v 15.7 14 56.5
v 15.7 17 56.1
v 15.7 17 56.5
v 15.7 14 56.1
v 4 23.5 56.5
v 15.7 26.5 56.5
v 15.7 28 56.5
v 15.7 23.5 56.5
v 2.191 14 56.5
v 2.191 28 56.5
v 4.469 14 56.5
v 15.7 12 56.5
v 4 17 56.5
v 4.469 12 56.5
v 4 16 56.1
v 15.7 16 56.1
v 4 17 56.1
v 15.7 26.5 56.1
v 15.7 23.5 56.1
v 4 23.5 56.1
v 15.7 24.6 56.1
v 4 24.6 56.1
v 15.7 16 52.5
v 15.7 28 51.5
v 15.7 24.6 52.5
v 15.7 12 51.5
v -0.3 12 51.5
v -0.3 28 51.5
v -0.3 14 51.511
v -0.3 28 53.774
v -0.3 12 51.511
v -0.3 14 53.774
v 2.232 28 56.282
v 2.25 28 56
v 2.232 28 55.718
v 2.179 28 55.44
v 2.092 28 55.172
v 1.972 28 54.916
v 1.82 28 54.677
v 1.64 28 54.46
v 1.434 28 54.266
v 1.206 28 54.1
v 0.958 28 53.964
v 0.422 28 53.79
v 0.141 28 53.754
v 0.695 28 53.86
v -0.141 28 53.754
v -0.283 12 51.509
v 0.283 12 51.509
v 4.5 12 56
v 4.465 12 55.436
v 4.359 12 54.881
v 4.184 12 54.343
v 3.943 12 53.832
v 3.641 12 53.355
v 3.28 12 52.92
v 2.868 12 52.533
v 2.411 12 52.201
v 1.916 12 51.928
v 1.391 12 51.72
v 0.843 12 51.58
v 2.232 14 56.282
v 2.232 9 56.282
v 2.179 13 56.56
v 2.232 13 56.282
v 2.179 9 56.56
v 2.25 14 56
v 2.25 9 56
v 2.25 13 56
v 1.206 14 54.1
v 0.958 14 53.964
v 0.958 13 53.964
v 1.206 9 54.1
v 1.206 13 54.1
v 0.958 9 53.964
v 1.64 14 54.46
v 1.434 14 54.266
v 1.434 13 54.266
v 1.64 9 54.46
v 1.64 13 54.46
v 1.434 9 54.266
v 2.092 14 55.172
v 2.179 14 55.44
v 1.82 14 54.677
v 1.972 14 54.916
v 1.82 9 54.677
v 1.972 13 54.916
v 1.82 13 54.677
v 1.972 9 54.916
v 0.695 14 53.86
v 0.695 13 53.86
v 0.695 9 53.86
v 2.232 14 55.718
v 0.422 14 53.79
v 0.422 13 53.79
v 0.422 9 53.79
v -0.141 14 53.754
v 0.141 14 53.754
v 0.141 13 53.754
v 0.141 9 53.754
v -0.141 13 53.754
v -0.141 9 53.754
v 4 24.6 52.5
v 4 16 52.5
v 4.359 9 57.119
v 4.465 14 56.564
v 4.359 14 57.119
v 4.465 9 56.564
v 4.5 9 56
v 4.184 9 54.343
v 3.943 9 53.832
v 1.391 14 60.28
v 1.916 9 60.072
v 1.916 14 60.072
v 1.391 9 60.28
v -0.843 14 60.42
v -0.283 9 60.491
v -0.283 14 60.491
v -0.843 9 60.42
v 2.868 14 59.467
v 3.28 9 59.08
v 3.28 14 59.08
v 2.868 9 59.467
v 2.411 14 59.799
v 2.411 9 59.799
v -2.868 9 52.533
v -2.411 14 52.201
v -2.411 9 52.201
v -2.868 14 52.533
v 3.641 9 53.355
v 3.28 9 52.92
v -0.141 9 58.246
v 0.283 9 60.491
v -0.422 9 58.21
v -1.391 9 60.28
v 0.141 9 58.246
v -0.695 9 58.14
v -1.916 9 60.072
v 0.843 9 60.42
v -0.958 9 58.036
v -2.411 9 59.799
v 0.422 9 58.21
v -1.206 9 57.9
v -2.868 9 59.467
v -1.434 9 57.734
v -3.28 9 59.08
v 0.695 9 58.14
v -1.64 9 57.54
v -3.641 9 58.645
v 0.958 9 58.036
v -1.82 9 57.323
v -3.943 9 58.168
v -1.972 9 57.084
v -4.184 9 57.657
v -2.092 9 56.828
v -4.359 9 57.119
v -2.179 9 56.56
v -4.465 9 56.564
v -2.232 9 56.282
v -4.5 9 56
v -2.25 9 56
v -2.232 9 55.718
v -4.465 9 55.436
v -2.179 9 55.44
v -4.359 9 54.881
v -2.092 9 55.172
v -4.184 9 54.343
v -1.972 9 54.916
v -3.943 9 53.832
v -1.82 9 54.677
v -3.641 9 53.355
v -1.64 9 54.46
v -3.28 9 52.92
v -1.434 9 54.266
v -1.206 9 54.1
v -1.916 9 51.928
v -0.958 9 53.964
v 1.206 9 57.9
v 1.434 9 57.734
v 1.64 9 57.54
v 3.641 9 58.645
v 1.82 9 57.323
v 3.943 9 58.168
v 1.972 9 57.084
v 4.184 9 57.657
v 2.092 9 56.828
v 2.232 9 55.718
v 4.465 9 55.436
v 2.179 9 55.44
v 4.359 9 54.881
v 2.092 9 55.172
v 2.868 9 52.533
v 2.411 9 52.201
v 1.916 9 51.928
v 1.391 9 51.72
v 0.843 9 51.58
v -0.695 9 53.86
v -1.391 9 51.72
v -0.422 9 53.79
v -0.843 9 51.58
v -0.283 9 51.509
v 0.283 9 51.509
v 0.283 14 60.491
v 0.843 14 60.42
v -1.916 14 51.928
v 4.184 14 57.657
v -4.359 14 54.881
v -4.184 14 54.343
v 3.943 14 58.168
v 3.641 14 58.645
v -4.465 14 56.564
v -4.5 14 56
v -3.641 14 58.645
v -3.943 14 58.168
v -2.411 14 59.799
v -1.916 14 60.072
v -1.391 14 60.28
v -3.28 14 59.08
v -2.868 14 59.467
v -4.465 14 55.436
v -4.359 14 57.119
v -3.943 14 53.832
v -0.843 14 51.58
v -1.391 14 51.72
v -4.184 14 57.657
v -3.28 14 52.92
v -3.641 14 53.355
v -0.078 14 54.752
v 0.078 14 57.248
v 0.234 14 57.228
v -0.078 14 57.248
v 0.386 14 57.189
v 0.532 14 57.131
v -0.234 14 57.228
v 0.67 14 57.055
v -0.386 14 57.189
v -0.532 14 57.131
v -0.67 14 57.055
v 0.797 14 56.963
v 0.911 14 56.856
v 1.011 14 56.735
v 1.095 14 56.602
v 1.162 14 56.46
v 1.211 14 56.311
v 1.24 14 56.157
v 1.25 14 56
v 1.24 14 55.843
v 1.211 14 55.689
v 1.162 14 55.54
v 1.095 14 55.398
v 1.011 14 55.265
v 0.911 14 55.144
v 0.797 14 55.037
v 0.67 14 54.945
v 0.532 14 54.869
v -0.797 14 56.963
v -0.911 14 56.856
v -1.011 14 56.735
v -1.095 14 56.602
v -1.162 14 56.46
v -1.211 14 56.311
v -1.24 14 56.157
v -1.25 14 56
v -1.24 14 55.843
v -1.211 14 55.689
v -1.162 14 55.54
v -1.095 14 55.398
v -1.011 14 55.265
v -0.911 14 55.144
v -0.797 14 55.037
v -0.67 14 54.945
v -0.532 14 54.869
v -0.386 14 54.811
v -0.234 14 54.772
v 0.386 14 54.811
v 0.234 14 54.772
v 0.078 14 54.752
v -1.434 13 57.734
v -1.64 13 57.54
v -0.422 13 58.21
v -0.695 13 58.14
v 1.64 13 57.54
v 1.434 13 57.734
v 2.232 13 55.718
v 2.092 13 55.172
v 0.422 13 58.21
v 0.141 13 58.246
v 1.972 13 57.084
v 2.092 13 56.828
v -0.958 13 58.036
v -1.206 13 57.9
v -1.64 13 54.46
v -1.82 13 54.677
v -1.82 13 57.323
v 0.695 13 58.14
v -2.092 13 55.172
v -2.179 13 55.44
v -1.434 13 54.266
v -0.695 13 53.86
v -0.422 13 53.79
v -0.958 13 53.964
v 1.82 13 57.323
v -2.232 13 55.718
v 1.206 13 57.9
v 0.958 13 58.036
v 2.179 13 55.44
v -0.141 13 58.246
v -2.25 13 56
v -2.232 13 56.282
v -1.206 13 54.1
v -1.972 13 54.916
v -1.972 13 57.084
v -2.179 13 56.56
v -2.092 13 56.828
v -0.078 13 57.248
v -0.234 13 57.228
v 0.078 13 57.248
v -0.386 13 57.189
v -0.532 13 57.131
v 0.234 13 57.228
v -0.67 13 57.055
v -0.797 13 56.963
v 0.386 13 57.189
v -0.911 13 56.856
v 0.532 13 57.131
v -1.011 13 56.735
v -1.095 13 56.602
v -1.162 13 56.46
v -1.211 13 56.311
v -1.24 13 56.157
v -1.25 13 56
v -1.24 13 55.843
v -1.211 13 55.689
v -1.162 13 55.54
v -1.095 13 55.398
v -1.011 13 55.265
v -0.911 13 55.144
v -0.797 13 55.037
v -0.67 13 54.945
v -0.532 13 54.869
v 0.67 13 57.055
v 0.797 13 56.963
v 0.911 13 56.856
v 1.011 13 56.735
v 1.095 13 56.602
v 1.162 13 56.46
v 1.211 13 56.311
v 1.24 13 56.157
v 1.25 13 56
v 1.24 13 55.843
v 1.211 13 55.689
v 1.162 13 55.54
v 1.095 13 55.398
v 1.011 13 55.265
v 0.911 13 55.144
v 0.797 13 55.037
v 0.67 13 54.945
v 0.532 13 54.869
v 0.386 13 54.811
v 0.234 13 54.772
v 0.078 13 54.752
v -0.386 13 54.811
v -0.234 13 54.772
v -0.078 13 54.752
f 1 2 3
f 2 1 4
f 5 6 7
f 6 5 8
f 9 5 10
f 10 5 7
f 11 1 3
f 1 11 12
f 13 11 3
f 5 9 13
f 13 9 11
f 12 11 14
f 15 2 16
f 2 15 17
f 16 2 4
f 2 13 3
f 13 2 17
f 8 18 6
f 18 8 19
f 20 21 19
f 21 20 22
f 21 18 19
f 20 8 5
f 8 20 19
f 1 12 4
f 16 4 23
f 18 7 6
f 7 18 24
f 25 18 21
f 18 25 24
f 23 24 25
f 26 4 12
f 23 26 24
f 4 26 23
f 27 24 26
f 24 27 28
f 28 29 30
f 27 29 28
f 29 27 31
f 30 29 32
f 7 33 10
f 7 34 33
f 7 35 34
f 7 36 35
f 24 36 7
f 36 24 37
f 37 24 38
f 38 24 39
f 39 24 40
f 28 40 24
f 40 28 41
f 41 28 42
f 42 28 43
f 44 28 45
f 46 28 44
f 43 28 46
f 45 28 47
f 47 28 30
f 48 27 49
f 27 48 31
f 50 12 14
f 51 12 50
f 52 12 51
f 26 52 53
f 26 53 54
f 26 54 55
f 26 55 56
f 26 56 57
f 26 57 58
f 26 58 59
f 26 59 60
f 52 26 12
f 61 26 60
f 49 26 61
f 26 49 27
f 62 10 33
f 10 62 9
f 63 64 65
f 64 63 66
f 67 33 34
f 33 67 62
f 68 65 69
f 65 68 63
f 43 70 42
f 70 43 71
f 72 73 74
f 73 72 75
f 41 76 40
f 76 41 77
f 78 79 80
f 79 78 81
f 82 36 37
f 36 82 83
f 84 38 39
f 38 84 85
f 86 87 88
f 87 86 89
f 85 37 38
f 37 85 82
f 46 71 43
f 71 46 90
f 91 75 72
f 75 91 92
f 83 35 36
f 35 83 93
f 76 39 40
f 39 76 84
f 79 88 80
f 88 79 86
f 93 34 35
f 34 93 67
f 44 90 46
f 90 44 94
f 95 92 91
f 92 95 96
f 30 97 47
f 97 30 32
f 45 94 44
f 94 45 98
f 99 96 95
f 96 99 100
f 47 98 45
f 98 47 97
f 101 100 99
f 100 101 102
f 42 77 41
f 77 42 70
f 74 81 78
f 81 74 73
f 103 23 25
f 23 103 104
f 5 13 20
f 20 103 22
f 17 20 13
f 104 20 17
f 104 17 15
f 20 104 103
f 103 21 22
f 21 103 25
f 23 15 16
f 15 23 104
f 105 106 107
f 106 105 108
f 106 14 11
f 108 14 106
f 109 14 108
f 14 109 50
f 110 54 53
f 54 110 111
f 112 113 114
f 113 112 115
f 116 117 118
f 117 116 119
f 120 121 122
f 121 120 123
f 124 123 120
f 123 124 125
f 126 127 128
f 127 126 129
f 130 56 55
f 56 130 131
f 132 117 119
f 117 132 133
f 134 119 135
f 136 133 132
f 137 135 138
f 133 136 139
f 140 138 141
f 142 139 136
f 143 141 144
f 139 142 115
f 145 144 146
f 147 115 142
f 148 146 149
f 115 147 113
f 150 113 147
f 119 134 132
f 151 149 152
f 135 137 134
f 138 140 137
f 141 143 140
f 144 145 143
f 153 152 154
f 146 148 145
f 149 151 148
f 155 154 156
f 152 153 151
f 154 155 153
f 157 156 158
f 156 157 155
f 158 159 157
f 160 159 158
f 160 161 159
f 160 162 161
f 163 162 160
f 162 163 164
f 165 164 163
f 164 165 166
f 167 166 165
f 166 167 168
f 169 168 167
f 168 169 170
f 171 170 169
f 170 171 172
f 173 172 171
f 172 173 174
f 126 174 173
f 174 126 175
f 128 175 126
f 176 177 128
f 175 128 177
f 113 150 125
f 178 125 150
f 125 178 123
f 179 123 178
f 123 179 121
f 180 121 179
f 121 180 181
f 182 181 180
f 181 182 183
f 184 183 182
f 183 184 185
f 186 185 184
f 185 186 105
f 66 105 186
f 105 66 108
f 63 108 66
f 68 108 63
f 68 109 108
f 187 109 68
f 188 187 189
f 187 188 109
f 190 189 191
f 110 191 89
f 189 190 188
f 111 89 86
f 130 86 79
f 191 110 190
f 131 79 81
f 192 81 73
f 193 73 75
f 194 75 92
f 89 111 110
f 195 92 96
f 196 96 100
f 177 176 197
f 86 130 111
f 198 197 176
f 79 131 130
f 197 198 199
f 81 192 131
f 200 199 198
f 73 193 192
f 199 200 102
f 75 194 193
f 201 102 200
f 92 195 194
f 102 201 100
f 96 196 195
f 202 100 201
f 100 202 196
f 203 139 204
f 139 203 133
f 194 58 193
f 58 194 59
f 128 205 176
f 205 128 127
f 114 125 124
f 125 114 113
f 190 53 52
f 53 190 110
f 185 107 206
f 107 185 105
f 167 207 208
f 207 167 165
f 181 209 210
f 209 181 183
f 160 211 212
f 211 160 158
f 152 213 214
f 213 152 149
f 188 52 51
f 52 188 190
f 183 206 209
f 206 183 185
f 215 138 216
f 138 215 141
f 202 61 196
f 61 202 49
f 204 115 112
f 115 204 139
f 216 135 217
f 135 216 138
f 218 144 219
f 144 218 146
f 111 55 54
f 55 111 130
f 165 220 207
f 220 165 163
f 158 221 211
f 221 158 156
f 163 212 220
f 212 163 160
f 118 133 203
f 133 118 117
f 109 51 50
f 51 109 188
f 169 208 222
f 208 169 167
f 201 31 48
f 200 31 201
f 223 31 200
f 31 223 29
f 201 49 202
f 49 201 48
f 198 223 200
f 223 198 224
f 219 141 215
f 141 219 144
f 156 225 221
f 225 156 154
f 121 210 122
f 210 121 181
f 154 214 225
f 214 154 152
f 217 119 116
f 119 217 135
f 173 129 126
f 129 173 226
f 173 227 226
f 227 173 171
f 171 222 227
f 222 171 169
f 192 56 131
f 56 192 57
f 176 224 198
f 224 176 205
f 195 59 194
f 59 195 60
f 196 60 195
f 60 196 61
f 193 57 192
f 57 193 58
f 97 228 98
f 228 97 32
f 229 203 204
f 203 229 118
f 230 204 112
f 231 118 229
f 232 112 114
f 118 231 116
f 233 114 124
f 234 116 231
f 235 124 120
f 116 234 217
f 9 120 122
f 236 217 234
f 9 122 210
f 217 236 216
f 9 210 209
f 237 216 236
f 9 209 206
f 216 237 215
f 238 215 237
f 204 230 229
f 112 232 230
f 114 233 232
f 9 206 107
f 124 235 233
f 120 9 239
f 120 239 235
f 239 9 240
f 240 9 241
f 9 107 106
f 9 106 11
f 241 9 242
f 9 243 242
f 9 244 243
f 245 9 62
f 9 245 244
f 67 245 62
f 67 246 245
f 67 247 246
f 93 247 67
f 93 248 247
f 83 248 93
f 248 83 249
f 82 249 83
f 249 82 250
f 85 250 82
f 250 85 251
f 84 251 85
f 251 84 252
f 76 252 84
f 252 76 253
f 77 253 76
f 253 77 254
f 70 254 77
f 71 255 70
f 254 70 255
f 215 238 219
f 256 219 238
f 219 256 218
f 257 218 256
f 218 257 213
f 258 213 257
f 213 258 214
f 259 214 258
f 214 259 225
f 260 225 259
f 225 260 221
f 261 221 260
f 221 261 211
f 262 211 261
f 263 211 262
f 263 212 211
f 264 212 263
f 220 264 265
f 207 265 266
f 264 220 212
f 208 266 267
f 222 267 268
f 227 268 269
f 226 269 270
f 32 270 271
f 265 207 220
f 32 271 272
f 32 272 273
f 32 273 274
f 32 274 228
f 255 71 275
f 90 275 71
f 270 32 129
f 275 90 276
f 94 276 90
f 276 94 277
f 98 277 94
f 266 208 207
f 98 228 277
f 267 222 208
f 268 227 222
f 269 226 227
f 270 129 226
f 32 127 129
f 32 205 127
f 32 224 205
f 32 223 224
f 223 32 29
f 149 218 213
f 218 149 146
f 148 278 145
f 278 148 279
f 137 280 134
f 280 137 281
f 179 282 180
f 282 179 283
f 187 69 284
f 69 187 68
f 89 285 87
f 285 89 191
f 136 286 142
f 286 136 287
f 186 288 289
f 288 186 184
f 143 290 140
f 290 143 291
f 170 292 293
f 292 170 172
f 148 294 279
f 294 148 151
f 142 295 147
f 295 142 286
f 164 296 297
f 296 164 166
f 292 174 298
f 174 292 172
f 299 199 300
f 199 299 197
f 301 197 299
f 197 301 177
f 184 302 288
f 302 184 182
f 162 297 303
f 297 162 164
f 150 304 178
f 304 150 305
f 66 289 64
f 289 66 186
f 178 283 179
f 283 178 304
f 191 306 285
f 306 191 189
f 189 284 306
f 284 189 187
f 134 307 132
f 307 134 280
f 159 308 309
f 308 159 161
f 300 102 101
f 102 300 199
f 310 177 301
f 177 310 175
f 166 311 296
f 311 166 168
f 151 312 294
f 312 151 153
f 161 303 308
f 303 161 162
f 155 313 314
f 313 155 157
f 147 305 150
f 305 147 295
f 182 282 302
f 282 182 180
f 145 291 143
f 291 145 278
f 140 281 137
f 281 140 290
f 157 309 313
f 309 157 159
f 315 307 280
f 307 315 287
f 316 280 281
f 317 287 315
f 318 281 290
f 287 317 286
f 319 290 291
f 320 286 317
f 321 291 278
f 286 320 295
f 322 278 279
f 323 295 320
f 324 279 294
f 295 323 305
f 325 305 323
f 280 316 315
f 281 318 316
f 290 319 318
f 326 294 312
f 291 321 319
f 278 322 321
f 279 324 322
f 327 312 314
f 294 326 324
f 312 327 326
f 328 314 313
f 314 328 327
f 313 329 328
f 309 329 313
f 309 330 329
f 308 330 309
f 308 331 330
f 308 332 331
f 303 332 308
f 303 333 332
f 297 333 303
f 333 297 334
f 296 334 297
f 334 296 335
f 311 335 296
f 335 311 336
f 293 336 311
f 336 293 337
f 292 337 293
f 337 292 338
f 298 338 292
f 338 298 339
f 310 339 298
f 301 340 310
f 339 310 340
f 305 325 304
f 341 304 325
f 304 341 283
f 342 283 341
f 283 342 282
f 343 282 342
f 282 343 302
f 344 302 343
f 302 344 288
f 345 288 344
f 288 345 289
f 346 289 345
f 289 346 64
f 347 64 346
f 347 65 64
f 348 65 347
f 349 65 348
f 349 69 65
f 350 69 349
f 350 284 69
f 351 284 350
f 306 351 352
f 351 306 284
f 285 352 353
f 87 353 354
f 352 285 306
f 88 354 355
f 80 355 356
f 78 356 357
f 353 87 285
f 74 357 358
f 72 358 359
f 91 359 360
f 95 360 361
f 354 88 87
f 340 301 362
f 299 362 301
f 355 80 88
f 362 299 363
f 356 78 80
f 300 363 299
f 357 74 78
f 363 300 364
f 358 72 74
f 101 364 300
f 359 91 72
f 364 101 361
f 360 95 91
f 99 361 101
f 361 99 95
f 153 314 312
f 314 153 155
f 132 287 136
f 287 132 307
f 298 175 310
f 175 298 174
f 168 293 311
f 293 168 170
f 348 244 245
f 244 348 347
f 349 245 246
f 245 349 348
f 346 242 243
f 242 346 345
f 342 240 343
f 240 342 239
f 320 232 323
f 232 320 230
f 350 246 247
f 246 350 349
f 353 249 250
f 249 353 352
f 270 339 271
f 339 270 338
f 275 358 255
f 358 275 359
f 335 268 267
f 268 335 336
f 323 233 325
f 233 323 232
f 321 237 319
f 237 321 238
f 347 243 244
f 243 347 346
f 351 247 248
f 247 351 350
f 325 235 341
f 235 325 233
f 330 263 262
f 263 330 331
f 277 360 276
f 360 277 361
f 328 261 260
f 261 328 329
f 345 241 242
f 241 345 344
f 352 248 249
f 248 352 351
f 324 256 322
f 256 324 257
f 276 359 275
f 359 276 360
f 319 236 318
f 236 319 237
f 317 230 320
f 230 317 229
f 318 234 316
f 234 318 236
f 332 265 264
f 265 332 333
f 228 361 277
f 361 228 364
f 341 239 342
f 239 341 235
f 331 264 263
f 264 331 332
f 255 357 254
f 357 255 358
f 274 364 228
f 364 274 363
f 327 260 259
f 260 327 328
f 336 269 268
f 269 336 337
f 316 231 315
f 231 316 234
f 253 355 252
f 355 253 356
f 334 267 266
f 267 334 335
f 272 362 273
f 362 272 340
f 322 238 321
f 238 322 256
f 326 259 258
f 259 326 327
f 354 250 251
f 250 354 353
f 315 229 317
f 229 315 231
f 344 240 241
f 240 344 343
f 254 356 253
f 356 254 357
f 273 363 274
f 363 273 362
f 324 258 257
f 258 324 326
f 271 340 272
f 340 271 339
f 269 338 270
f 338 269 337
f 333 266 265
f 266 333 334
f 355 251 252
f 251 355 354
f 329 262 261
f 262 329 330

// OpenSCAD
// file: servo.scad
module servo() {
    difference() {
        union() {
            translate([-5.9,-11.8/2,0]) cube([22.5,11.8,22.7]);
            translate([0,0,22.7-0.1]){
                cylinder(d=11.8,h=4+0.1);
                hull(){
                    translate([8.8-5/2,0,0]) cylinder(d=5,h=4+0.1);
                    cylinder(d=5,h=4+0.1);
                }
                translate([0,0,4]) cylinder(d=4.6,h=3.2);
            }
            translate([-4.7-5.9,-11.8/2,15.9]) cube([22.5+4.7*2, 11.8, 2.5]); 
        }
        //screw holes
        translate([-2.3-5.9,0,15.9+1.25]) cylinder(d=2,h=5, center=true);
        translate([-2.3-5.9-2,0,15.9+1.25]) cube([3,1.3,5], center=true);
        translate([2.3+22.5-5.9,0,15.9+1.25]) cylinder(d=2,h=5, center=true);
        translate([2.3+22.5-5.9+2,0,15.9+1.25]) cube([3,1.3,5], center=true);
    }
}
// main file
$fn = 50;

use<servo.scad>;

//#translate([0, 0, 0]) servo();
//#translate([8, -18, 22 + 29.2]) rotate([90, 0, 180]) servo();

outer_fn = 18;
inner_fn = 180;

!translate([-14, 12, 55]) cam_mount();

difference() {
    translate([0, 0, 0]) {
        base();
        top();
    }
    translate([0, 60, 24]) {
        //cube([100, 50, 50], true);
    }
}

module base() {
    difference() {
        cylinder(d = 100, h = 3, $fn = outer_fn);
        translate([0, 0, -0.1]) scale([1.075, 1, 1]) servo();
       
        // Cut-out's
        translate([-23, 17, -1]) { 
            minkowski() {
                cube([46, 16, 10]);
                cylinder(d = 6, h = 1);
            }
        }
        translate([-23, -33, -1]) { 
            minkowski() {
                cube([46, 16, 10]);
                cylinder(d = 6, h = 1);
            }
        }
    }
    
    // Servo mount
    translate([17, -6, 0]) difference() {
        translate([0, -1, 0]) {
            translate([0, 0, 0]) cube([5, 14, 16]);
            translate([4.1, 0, 0]) 
                rotate([0, -15, 0]) cube([5, 14, 15.2]);
        }
        translate([2, 6, 5]) cylinder(d = 2, h = 14);
    }
    translate([-11.25, -6, 0]) difference() {
        translate([0, -1, 0]) {
            cube([5, 14, 16]);
            translate([-3.95, 0, 1.3]) 
                rotate([0, 15, 0]) cube([5, 14, 15.2]);
        }
        translate([-4, 2, 0]) cube([10, 8, 10]);
        translate([3, 6, 5]) cylinder(d = 2, h = 14);
    }
    
    // Ring
    difference() {
        translate([0, 0, 0]) {
            cylinder(d = 100, h = 3, $fn = outer_fn);
            translate([0, 0, 23]) cylinder(d = 100, h = 8, $fn = outer_fn);
            
            parts = 9;
            diameter = 72.55;
            for(i = [0:parts]) {
               rotate(i * 360 / parts + 8.8)
                    translate([30, diameter / 2, 0]) {
                        rotate([90, 0, 151.2]) cube([17.4, 24, 3]);
                    }
            }
        }
        translate([0, 0, -1]) cylinder(d = 94, h = 34, $fn = inner_fn);
        translate([0, 0, 26.8]) cylinder(d = 97, h = 5.1, $fn = inner_fn);
        
    }
}

module top() {
    y_offset = 2;
    z_offset = 0;
    translate([0, 0, 27 + z_offset]) {
        difference() {
            cylinder(d = 96.4, h = 4, $fn = inner_fn);
            translate([0, 0, -7]) cylinder(d = 4.5, h = 10);
            translate([0, 0, -4]) cylinder(d = 2.5, h = 10);
            
            // Pi Mount
            translate([0, 22, 9]) 
                rotate([0, 0, 180]) {
                    //#import("raspberry_pi_zero_2_w.stl");
                }
                
            // Cut-out Pi
            translate([-23, 7 + y_offset, -5]) { 
                minkowski() {
                    cube([46, 22, 10]);
                    cylinder(d = 6, h = 1);
                }
            }
            
            // Cut-out cables
            translate([-23, -28, -5]) { 
                minkowski() {
                    cube([46, 6, 10]);
                    cylinder(d = 6, h = 1);
                }
            }
            
            // Pi mount holes
            translate([0, y_offset, 0]) pi_mounting_holes();
        }
    
        // Pi mount
        difference() {
            translate([0, y_offset, 4]) {
                translate([-29, 29.5, 0]) cylinder(d = 6, h = 6);
                translate([-29, 6.5, 0]) cylinder(d = 6, h = 6);
                translate([29, 29.5, 0]) cylinder(d = 6, h = 6);
                translate([29, 6.5, 0]) cylinder(d = 6, h = 6);
            }
            translate([0, y_offset, 3.1]) pi_mounting_holes();
        }
        
        // Servo mount
        difference() {
            translate([8, 8, 0]) {
                translate([6.2, -20, 0]) cube([5, 10, 30]);
                translate([-21.8, -20, 0]) cube([5, 10, 30]);
                translate([-21.8, -20, 15]) cube([30, 10, 3]);
                
                translate([6.2, -25, 3]) 
                    rotate([-15, 0, 0]) cube([5, 10, 20]);
                translate([-21.8, -25, 3]) 
                    rotate([-15, 0, 0]) cube([5, 10, 20]);
                
                translate([6.2, -16, 0]) 
                    rotate([15, 0, 0]) cube([5, 10, 16.5]);
                translate([-21.8, -16, 0]) 
                    rotate([15, 0, 0]) cube([5, 10, 16.5]);
            }
            translate([16.1, 0, 24.2]) 
                rotate([90, 0, 0]) 
                    cylinder(d = 2, h = 16);
            translate([-10.9, 0, 24.2]) 
                rotate([90, 0, 0]) 
                    cylinder(d = 2, h = 16);
        }
    }

}

module cam_mount() {
    translate([13.7, 0, -3.5]) {
        #translate([4, 2, 4.6]) cube([12, 3, 0.4]);
        #translate([4, 11.5, 4.6]) cube([12, 3, 0.4]);
    }
    
    difference() {
        translate([13.7, 0, -3.5]) {
            cube([16, 16, 5]);

        }
        translate([14, 20, 1]) rotate([90, 0, 0]) cylinder(d = 4.5, h = 25);
        translate([18, 4, -2.5]) cube([12, 8.6, 5]);
    }
    translate([14, 2, 1]) rotate([90, 0, 0]) difference() {
        cylinder(d = 9, h = 5);
        translate([0, 0, 1]) cylinder(d = 4.5, h = 8);
        translate([0, 0, -3]) cylinder(d = 2.5, h = 8);
    }
}

module pi_mounting_holes() {
    translate([0, 0, -1]) {
        translate([-29, 29.5, 0]) cylinder(d = 2.7, h = 8);
        translate([-29, 6.5, 0]) cylinder(d = 2.7, h = 8);
        translate([29, 29.5, 0]) cylinder(d = 2.7, h = 8);
        translate([29, 6.5, 0]) cylinder(d = 2.7, h = 8);
    }
}
